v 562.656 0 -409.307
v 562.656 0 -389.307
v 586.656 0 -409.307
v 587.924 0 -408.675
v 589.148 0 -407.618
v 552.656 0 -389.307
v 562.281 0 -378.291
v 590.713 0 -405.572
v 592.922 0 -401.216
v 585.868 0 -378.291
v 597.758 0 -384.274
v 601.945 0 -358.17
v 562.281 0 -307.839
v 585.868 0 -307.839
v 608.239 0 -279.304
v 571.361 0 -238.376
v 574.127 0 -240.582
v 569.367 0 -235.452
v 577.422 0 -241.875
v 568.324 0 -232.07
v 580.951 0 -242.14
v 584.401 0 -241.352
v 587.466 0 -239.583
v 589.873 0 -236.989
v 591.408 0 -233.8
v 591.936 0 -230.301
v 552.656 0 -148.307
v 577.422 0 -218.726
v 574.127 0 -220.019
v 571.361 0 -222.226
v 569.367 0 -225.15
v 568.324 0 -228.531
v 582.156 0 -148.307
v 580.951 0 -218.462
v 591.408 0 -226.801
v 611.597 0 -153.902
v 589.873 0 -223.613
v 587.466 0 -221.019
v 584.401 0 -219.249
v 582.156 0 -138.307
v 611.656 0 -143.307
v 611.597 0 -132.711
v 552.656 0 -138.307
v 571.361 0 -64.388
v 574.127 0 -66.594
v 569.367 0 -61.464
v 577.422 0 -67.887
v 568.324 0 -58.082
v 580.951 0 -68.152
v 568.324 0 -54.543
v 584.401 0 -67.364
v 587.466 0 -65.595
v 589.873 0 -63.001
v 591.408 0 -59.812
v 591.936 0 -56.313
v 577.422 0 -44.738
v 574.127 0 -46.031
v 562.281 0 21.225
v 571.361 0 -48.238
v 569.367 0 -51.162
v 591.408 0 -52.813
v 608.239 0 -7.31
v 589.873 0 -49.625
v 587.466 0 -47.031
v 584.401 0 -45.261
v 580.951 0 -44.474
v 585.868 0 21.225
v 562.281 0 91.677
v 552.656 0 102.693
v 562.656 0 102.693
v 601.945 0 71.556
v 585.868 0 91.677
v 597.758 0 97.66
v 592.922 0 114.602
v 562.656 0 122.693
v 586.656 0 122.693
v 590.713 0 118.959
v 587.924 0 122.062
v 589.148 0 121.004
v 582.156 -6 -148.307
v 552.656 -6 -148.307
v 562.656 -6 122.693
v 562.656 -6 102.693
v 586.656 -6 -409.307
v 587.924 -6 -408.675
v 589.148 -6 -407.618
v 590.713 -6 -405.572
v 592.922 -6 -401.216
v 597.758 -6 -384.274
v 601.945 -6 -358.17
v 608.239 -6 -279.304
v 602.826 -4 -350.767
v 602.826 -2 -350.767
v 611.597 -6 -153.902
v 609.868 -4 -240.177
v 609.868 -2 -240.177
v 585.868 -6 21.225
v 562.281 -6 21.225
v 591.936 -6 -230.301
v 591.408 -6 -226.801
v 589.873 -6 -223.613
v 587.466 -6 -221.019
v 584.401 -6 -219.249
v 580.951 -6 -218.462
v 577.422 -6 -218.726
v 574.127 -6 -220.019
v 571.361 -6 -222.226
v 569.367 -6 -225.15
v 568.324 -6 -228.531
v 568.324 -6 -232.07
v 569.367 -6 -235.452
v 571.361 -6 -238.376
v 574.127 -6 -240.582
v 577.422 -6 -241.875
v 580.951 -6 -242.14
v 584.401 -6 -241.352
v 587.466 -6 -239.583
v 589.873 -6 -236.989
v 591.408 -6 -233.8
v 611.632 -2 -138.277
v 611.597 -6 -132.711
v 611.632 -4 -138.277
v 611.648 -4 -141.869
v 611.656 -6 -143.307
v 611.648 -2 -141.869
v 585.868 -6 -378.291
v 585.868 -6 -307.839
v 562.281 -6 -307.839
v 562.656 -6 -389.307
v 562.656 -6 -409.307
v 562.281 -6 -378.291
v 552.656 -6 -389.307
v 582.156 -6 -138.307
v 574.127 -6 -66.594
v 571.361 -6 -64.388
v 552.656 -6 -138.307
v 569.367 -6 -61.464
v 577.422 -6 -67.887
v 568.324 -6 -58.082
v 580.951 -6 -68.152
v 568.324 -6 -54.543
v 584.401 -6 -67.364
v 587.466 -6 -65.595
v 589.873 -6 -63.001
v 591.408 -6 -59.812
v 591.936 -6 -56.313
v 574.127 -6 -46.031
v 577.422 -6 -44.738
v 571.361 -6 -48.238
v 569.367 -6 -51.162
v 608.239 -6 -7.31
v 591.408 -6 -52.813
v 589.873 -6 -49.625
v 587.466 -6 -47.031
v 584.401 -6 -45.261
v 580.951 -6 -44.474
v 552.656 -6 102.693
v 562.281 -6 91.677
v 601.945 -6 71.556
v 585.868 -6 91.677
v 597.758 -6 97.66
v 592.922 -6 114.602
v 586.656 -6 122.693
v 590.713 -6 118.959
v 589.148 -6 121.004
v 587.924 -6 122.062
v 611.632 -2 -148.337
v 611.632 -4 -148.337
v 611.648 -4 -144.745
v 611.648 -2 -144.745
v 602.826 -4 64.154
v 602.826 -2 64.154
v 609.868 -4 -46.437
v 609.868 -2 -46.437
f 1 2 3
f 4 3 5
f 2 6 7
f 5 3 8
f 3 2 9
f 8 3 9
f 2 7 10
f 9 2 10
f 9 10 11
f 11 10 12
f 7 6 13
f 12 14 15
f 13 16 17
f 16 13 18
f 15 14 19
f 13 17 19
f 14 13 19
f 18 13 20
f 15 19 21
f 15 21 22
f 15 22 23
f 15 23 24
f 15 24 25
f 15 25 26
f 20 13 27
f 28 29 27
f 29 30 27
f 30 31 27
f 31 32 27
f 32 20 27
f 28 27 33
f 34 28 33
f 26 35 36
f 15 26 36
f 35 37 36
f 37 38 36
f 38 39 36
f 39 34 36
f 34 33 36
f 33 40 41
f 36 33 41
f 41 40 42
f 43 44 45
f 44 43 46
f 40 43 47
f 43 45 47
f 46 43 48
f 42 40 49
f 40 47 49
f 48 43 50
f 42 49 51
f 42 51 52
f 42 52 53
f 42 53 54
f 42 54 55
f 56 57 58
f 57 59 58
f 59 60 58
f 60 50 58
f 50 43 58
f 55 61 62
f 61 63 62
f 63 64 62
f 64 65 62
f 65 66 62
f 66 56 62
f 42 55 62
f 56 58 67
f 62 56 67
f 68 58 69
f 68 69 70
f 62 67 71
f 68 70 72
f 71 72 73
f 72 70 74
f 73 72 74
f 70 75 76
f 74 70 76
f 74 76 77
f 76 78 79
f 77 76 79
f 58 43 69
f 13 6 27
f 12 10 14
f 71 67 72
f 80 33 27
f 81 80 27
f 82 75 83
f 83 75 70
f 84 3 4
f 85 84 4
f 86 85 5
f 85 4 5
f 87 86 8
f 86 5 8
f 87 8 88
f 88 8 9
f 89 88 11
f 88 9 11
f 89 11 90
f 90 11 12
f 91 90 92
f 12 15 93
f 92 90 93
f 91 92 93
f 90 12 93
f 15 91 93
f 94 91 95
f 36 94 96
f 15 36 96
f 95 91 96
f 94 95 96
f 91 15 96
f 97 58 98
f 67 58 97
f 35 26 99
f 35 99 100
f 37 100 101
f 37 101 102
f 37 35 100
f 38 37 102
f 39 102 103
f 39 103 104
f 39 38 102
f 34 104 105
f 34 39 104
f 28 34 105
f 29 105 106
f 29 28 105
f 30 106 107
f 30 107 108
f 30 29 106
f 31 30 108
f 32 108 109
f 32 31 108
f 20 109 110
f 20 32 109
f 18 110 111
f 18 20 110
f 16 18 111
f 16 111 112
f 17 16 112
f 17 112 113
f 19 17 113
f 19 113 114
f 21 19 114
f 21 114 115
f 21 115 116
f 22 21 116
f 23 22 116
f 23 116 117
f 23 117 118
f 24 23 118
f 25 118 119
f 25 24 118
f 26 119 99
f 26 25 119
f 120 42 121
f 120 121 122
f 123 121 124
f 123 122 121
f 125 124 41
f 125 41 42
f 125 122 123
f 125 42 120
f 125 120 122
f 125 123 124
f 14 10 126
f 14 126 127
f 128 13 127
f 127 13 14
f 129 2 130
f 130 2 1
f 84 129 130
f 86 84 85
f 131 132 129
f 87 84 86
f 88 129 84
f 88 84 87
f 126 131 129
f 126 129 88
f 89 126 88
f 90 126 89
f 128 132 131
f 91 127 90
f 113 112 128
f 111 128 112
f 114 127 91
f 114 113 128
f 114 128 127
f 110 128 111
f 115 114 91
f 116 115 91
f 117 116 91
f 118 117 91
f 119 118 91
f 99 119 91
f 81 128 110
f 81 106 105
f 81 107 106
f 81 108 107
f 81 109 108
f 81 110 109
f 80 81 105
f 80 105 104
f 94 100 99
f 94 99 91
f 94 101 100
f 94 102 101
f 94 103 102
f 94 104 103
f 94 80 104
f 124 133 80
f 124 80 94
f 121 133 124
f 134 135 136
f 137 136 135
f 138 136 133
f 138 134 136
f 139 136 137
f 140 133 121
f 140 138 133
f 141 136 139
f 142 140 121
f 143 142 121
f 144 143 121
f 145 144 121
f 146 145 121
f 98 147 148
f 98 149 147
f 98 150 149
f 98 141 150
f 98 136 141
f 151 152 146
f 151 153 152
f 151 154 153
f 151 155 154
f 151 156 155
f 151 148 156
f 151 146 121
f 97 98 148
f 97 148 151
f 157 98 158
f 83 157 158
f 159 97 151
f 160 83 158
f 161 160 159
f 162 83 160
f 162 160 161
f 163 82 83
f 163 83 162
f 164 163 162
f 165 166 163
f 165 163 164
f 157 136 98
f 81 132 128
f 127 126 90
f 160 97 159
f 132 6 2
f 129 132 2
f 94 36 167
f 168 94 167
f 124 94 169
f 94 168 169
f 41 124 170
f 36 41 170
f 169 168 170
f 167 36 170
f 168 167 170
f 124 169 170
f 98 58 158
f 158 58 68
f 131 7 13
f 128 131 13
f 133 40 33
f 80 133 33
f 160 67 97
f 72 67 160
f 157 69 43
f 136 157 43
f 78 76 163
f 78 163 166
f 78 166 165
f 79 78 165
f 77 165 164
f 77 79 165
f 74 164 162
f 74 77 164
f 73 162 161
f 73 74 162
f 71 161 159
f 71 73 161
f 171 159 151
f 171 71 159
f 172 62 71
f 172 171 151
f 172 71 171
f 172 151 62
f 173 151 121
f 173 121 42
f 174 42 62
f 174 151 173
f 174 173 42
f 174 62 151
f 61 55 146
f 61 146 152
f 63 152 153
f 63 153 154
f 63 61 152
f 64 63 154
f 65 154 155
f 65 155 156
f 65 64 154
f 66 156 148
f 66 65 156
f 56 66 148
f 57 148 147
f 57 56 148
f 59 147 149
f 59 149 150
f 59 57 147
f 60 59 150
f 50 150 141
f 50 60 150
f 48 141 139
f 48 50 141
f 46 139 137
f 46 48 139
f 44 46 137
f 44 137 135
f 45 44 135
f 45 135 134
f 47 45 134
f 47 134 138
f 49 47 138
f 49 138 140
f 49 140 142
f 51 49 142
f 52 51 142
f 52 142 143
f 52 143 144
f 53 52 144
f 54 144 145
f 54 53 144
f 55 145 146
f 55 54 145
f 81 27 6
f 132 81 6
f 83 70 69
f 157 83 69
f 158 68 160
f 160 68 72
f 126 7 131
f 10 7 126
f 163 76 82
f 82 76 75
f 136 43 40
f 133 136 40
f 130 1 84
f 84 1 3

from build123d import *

# Parameters (mm, degrees)
F0_W     = 23.5877633095
F0_H     = 70.452131331
F0_R     = 11.8720680475
F1_DEPTH = 6


# Not quite as in the source:
# - a feature names something its author has since deleted; it is built from what else it names


with BuildPart() as f1:
    # F0 (on Front) → F1 (new body)
    with BuildSketch(Plane.XZ):
        with BuildLine():
            add(Edge.make_bspline(
                [(611.5972634537, -153.9022508941), (611.6433594367, -147.41064865), (611.6495089066, -143.6068529658), (611.6564787513, -143.3067750725)],
                knots=[235.725136676, 235.725136676, 235.725136676, 235.725136676, 267.1722290958, 267.1722290958, 267.1722290958, 267.1722290958], degree=3))
            Line((611.6564787513, -143.3067750725), (582.1564787513, -143.3067750725))
            Line((582.1564787513, -143.3067750725), (582.1564787513, -148.3067750725))
            Line((582.1564787513, -148.3067750725), (552.6564787513, -148.3067750725))
            Line((552.6564787513, -148.3067750725), (552.6564787513, -389.3067750725))
            Line((552.6564787513, -389.3067750725), (562.6564787513, -389.3067750725))
            Line((562.6564787513, -389.3067750725), (562.6564787513, -409.3067750725))
            Line((562.6564787513, -409.3067750725), (586.6564787513, -409.3067750725))
            add(Edge.make_bspline(
                [(586.6564787513, -409.3067750725), (608.6616471129, -402.2484026518), (611.2517312901, -202.5628331126), (611.5972634537, -153.9022508941)],
                knots=[0, 0, 0, 0, 235.725136676, 235.725136676, 235.725136676, 235.725136676], degree=3))
        make_face()
        with Locations((574.0745894078, -343.064654055)):
            Rectangle(F0_W, F0_H, mode=Mode.SUBTRACT)
        with Locations((580.0634622574, -230.3008177464)):
            Circle(F0_R, mode=Mode.SUBTRACT)
        with BuildLine():
            add(Edge.make_bspline(
                [(586.6564787513, 122.6932249275), (608.6616471129, 115.6348525069), (611.2517312901, -84.0507170322), (611.5972634537, -132.7112992508)],
                knots=[0, 0, 0, 0, 235.725136676, 235.725136676, 235.725136676, 235.725136676], degree=3))
            Line((586.6564787513, 122.6932249275), (562.6564787513, 122.6932249275))
            Line((562.6564787513, 122.6932249275), (562.6564787513, 102.6932249275))
            Line((562.6564787513, 102.6932249275), (552.6564787513, 102.6932249275))
            Line((552.6564787513, 102.6932249275), (552.6564787513, -138.3067750725))
            Line((552.6564787513, -138.3067750725), (582.1564787513, -138.3067750725))
            Line((582.1564787513, -138.3067750725), (582.1564787513, -143.3067750725))
            Line((582.1564787513, -143.3067750725), (611.6564787513, -143.3067750725))
            add(Edge.make_bspline(
                [(611.5972634537, -132.7112992508), (611.6433594367, -139.2029014949), (611.6495089066, -143.0066971792), (611.6564787513, -143.3067750725)],
                knots=[235.725136676, 235.725136676, 235.725136676, 235.725136676, 267.1722290958, 267.1722290958, 267.1722290958, 267.1722290958], degree=3))
        make_face()
        with Locations((580.0634622574, -56.3127323985)):
            Circle(F0_R, mode=Mode.SUBTRACT)
        with Locations((574.0745894078, 56.4511039101)):
            Rectangle(F0_W, F0_H, mode=Mode.SUBTRACT)
    extrude(amount=F1_DEPTH)


solid = f1.part
